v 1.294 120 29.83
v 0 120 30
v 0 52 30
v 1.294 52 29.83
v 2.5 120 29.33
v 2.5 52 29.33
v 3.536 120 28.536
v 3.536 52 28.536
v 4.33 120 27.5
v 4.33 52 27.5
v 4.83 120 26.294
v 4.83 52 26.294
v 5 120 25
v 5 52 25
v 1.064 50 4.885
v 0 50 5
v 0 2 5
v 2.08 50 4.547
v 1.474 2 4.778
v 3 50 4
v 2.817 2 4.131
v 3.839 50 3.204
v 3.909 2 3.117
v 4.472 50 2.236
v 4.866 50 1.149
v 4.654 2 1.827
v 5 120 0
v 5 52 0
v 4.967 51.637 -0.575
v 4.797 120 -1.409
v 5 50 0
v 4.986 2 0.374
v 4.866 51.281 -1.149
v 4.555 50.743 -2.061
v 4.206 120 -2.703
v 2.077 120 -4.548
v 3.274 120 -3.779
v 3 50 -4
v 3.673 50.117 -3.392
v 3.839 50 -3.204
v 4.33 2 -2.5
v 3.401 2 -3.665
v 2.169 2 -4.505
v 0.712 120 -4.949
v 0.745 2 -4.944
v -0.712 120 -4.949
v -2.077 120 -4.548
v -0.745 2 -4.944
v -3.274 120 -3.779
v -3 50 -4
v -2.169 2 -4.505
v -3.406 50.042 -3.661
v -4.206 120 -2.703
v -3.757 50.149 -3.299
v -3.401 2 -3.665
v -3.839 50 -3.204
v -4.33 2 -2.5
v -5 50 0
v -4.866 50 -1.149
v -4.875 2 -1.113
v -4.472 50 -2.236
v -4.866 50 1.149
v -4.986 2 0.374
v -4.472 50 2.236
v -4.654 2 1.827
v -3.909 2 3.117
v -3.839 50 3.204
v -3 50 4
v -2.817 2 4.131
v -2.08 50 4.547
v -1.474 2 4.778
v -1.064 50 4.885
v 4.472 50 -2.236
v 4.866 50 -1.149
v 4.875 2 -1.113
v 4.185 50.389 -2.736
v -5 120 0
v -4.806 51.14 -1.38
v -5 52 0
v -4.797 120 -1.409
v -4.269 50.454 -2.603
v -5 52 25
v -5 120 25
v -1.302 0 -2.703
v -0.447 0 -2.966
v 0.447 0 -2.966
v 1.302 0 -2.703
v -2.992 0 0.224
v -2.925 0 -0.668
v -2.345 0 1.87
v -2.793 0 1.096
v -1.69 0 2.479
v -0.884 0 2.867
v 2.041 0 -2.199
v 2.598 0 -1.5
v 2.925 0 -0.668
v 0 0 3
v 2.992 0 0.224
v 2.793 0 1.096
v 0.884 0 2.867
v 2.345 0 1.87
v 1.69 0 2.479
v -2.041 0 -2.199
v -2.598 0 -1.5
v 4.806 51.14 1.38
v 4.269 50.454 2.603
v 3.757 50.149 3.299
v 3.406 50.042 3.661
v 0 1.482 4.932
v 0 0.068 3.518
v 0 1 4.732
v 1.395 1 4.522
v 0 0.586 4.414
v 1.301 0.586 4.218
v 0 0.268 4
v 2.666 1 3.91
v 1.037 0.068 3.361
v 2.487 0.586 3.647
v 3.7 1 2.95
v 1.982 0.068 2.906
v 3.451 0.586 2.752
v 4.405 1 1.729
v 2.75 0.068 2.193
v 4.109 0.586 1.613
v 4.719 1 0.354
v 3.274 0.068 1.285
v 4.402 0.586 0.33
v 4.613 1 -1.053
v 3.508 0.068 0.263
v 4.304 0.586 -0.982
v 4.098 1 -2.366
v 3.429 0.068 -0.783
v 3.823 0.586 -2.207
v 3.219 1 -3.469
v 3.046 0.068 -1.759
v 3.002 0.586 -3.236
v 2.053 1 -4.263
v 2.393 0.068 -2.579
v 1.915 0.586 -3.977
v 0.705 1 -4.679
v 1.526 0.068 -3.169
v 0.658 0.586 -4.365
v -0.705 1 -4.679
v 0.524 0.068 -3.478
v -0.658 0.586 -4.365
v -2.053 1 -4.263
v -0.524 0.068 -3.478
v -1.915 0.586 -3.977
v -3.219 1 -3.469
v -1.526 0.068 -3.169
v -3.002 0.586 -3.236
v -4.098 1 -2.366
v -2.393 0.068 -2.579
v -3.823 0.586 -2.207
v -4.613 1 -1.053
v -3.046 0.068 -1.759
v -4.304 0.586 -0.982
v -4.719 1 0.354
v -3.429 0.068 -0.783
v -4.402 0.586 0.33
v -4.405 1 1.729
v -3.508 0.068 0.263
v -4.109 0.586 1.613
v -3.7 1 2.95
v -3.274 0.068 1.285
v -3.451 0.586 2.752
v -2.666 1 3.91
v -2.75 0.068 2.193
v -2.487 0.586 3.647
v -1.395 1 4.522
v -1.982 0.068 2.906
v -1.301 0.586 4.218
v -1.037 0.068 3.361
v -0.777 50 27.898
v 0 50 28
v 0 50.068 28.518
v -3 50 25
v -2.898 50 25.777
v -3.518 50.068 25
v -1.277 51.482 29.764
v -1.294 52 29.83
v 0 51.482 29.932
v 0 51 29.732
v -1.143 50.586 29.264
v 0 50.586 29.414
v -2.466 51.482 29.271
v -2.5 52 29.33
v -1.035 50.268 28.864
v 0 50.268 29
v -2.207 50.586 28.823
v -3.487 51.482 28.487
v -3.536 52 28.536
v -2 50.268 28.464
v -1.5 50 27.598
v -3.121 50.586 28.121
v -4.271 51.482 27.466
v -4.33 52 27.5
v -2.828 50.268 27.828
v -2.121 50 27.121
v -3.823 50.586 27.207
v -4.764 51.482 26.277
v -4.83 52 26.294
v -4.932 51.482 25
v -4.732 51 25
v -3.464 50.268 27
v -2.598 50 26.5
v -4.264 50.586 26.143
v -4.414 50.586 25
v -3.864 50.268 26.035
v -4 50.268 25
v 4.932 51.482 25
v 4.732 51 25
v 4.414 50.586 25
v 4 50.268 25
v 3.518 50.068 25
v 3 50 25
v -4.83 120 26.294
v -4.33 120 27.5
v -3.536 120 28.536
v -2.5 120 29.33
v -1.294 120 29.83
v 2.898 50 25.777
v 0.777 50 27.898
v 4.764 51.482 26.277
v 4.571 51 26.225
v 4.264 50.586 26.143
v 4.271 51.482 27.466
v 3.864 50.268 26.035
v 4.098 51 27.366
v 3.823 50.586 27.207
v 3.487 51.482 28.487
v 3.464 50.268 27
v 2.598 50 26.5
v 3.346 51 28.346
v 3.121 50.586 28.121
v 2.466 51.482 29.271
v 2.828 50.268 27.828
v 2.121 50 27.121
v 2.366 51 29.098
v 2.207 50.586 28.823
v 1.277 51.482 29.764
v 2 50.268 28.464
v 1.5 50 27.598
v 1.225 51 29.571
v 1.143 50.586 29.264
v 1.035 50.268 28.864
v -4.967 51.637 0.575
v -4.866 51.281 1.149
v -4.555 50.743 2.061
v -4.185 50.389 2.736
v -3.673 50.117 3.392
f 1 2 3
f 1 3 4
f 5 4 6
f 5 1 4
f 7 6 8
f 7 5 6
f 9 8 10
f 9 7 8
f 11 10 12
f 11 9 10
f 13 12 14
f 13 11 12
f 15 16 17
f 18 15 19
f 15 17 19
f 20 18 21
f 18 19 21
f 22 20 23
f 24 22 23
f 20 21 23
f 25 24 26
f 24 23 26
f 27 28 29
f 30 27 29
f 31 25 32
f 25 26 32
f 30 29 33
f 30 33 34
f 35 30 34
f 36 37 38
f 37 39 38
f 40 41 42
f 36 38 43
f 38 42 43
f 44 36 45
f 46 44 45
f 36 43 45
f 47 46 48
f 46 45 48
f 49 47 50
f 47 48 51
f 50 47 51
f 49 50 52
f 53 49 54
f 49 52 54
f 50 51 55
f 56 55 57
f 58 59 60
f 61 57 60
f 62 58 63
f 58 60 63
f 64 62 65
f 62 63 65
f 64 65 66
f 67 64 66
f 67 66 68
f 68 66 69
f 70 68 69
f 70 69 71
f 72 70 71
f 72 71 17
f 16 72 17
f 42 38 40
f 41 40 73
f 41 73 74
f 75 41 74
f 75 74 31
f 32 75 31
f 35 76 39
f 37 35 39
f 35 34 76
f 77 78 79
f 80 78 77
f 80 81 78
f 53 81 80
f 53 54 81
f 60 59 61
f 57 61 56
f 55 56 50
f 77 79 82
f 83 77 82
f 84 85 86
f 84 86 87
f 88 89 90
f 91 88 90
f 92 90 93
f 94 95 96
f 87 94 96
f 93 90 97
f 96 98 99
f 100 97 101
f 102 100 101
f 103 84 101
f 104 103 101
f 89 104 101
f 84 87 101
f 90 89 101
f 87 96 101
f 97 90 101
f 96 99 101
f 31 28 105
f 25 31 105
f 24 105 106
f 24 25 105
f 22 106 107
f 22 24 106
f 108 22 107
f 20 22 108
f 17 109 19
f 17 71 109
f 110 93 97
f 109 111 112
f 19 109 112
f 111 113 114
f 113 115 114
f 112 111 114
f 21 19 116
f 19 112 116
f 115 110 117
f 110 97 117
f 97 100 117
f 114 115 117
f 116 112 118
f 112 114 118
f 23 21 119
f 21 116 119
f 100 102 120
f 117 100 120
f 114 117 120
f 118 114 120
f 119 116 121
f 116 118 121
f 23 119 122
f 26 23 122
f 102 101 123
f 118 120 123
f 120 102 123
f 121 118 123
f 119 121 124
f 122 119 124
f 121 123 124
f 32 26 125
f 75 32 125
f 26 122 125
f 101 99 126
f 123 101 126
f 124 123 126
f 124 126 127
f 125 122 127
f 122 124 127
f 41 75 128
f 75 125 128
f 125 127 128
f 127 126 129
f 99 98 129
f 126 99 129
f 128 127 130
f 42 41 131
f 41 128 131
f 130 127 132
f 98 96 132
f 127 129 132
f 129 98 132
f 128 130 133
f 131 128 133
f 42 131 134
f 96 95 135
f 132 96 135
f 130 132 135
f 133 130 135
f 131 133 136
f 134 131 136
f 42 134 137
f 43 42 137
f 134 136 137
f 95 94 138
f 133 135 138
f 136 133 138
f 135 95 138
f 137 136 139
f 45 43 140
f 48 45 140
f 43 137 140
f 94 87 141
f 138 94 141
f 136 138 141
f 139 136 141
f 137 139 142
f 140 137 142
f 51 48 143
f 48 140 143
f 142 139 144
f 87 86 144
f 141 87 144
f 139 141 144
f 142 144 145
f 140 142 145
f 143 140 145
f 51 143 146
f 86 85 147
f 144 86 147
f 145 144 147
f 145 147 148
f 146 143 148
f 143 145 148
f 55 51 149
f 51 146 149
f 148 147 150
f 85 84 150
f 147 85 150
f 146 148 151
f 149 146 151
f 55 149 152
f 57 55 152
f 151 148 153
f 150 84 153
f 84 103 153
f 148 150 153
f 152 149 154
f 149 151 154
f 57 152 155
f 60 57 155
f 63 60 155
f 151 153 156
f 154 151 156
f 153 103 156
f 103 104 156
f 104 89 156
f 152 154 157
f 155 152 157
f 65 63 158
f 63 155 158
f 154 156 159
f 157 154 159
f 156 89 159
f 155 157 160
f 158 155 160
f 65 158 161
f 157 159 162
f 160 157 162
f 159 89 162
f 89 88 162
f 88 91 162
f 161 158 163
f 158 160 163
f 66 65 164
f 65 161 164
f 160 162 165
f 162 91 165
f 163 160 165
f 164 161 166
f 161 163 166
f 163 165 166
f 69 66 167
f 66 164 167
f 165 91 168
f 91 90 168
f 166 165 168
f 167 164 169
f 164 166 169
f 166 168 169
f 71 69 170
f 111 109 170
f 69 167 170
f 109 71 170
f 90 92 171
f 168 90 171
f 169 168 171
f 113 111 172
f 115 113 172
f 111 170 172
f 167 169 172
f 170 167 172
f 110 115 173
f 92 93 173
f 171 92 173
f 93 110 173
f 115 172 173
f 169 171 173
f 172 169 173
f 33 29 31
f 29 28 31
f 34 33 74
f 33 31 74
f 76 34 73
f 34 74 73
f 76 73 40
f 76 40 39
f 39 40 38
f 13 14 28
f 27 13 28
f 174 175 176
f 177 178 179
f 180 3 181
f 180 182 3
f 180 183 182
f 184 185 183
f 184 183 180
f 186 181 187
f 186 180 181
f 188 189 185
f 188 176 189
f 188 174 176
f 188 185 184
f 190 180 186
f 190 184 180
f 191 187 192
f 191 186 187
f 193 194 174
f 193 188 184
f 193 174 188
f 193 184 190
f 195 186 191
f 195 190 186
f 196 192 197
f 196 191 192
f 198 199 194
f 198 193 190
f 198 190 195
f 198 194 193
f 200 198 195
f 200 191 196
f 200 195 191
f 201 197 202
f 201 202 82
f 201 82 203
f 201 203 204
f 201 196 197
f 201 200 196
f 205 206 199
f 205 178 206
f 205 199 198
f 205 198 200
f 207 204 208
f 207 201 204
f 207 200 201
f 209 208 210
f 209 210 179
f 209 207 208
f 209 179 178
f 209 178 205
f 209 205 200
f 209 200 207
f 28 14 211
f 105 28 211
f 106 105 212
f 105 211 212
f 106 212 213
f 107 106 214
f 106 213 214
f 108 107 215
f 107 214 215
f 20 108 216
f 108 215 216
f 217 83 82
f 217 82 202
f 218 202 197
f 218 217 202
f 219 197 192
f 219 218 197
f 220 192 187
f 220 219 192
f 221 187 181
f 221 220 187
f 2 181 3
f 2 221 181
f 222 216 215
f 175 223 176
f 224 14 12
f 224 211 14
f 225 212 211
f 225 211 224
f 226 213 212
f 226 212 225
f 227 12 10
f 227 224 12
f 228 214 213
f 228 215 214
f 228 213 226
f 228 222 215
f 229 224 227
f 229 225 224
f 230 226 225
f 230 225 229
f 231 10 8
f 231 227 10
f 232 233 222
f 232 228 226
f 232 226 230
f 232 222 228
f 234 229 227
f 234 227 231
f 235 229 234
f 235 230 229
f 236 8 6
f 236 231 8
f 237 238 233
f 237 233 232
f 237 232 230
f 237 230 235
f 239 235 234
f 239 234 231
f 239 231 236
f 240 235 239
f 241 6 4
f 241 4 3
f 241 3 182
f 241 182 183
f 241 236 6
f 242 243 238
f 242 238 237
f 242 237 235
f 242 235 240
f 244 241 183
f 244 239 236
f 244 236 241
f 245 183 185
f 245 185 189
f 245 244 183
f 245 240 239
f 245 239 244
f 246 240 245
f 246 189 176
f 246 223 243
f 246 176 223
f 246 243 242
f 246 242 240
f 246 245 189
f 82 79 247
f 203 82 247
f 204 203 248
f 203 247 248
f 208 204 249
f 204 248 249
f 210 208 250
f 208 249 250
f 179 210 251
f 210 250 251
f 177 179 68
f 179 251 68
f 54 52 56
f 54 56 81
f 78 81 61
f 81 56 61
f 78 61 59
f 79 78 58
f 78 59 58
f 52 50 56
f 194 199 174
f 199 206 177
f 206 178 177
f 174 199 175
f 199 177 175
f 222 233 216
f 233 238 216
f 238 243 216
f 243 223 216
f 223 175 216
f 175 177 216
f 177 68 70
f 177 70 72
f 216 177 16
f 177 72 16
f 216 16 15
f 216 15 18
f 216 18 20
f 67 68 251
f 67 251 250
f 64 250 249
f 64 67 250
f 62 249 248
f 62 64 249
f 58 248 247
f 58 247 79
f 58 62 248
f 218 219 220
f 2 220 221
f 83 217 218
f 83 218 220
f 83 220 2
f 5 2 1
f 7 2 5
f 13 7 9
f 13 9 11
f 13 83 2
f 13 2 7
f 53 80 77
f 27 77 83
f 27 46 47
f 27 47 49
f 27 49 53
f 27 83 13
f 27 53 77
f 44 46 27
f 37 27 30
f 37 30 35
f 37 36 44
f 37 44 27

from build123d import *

# Parameters (mm, degrees)
SKETCH1_R           = 5
BOSS_EXTRUDE1_DEPTH = 50
BOSS_EXTRUDE2_DEPTH = 70
FILLET1_R           = 5
FILLET2_R           = 2
FILLET3_R           = 2


# Some blends are built 0.0001 mm under size
with BuildPart() as part:
    # Sketch1 → Boss-Extrude1 (new body)
    with BuildSketch(Plane(origin=(0, 0, 0), x_dir=(1, 0, 0), z_dir=(0, 1, 0))):
        with Locations(Location((0, 0, 0), (0, 0, 270))):
            Circle(SKETCH1_R)
    extrude(amount=BOSS_EXTRUDE1_DEPTH)

    # Sketch2 → Boss-Extrude2 (add)
    with BuildSketch(Plane(origin=(0, 50, 0), x_dir=(1, 0, 0), z_dir=(0, 1, 0))):
        with BuildLine():
            Line((-5, 0), (-5, -30))
            Line((-5, -30), (5, -30))
            Line((5, -30), (5, 0))
            ThreePointArc((5, 0), (0, 5), (-5, 0))
        make_face()
    extrude(amount=BOSS_EXTRUDE2_DEPTH)

    # Fillet1
    fillet1_edges = [part.edges().sort_by_distance(p)[0] for p in [
        (-5, 85, 30),
        (5, 85, 30),
    ]]
    fillet(fillet1_edges, radius=FILLET1_R - 0.0001)  # a hair under: the kernel refuses the full size

    # Fillet2
    # the kernel refuses this fillet: 2 mm, written as the material it takes off along each edge
    with BuildSketch(Plane(origin=(5, 50, 25.0001), x_dir=(-1, 0, 0), z_dir=(0, 0, -1))) as fillet2_piece_1_section:
        with BuildLine():
            CenterArc((FILLET2_R, FILLET2_R), FILLET2_R, 180, 90)
            Line((0, FILLET2_R), (0, 0))
            Line((0, 0), (FILLET2_R, 0))
        make_face()
    fillet2_piece_1 = extrude(amount=30.0001, mode=Mode.PRIVATE)
    fillet2_piece_1 = fillet2_piece_1 - Plane(origin=(0, 50.338854102, 0), x_dir=(0, 0, 1), z_dir=(0, -1, 0)) * Cylinder(5, 69, mode=Mode.PRIVATE)
    add(fillet2_piece_1, mode=Mode.SUBTRACT)
    with BuildSketch(Plane(origin=(0.0001, 50, 25.0001), x_dir=(1, 0, 0), z_dir=(0, 0, -1))) as fillet2_piece_2:
        with BuildLine():
            CenterArc((4.9999 - FILLET2_R, -FILLET2_R), FILLET2_R, 0, 90)
            Line((4.9999, -FILLET2_R), (4.9999, 0))
            Line((4.9999, 0), (4.9999 - FILLET2_R, 0))
        make_face()
    revolve(axis=Axis((0.0001, 50, 25.0001), (0, -1, 0)), revolution_arc=90, mode=Mode.SUBTRACT)
    with BuildSketch(Plane(origin=(-0.0001, 50, 25.0001), x_dir=(0, 0, 1), z_dir=(1, 0, 0))) as fillet2_piece_3:
        with BuildLine():
            CenterArc((4.9999 - FILLET2_R, -FILLET2_R), FILLET2_R, 0, 90)
            Line((4.9999, -FILLET2_R), (4.9999, 0))
            Line((4.9999, 0), (4.9999 - FILLET2_R, 0))
        make_face()
    revolve(axis=Axis((-0.0001, 50, 25.0001), (0, -1, 0)), revolution_arc=90, mode=Mode.SUBTRACT)
    with BuildSketch(Plane(origin=(-5, 50, -5), x_dir=(1, 0, 0), z_dir=(0, 0, 1))) as fillet2_piece_4_section:
        with BuildLine():
            CenterArc((FILLET2_R, FILLET2_R), FILLET2_R, 180, 90)
            Line((0, FILLET2_R), (0, 0))
            Line((0, 0), (FILLET2_R, 0))
        make_face()
    fillet2_piece_4 = extrude(amount=30.0001, mode=Mode.PRIVATE)
    fillet2_piece_4 = fillet2_piece_4 - Plane(origin=(0, 50.465433579, 0), x_dir=(0, 0, 1), z_dir=(0, -1, 0)) * Cylinder(5, 69, mode=Mode.PRIVATE)
    add(fillet2_piece_4, mode=Mode.SUBTRACT)
    with BuildSketch(Plane(origin=(-0.0001, 50, 30), x_dir=(0, 0, -1), z_dir=(1, 0, 0))) as fillet2_piece_5:
        with BuildLine():
            CenterArc((FILLET2_R, FILLET2_R), FILLET2_R, 180, 90)
            Line((0, FILLET2_R), (0, 0))
            Line((0, 0), (FILLET2_R, 0))
        make_face()
    extrude(amount=0.0002, mode=Mode.SUBTRACT)

    # Fillet3
    fillet3_edges = [part.edges().sort_by_distance(p)[0] for p in [
        (0, 0, -5),
    ]]
    fillet(fillet3_edges, radius=FILLET3_R)


solid = part.part
